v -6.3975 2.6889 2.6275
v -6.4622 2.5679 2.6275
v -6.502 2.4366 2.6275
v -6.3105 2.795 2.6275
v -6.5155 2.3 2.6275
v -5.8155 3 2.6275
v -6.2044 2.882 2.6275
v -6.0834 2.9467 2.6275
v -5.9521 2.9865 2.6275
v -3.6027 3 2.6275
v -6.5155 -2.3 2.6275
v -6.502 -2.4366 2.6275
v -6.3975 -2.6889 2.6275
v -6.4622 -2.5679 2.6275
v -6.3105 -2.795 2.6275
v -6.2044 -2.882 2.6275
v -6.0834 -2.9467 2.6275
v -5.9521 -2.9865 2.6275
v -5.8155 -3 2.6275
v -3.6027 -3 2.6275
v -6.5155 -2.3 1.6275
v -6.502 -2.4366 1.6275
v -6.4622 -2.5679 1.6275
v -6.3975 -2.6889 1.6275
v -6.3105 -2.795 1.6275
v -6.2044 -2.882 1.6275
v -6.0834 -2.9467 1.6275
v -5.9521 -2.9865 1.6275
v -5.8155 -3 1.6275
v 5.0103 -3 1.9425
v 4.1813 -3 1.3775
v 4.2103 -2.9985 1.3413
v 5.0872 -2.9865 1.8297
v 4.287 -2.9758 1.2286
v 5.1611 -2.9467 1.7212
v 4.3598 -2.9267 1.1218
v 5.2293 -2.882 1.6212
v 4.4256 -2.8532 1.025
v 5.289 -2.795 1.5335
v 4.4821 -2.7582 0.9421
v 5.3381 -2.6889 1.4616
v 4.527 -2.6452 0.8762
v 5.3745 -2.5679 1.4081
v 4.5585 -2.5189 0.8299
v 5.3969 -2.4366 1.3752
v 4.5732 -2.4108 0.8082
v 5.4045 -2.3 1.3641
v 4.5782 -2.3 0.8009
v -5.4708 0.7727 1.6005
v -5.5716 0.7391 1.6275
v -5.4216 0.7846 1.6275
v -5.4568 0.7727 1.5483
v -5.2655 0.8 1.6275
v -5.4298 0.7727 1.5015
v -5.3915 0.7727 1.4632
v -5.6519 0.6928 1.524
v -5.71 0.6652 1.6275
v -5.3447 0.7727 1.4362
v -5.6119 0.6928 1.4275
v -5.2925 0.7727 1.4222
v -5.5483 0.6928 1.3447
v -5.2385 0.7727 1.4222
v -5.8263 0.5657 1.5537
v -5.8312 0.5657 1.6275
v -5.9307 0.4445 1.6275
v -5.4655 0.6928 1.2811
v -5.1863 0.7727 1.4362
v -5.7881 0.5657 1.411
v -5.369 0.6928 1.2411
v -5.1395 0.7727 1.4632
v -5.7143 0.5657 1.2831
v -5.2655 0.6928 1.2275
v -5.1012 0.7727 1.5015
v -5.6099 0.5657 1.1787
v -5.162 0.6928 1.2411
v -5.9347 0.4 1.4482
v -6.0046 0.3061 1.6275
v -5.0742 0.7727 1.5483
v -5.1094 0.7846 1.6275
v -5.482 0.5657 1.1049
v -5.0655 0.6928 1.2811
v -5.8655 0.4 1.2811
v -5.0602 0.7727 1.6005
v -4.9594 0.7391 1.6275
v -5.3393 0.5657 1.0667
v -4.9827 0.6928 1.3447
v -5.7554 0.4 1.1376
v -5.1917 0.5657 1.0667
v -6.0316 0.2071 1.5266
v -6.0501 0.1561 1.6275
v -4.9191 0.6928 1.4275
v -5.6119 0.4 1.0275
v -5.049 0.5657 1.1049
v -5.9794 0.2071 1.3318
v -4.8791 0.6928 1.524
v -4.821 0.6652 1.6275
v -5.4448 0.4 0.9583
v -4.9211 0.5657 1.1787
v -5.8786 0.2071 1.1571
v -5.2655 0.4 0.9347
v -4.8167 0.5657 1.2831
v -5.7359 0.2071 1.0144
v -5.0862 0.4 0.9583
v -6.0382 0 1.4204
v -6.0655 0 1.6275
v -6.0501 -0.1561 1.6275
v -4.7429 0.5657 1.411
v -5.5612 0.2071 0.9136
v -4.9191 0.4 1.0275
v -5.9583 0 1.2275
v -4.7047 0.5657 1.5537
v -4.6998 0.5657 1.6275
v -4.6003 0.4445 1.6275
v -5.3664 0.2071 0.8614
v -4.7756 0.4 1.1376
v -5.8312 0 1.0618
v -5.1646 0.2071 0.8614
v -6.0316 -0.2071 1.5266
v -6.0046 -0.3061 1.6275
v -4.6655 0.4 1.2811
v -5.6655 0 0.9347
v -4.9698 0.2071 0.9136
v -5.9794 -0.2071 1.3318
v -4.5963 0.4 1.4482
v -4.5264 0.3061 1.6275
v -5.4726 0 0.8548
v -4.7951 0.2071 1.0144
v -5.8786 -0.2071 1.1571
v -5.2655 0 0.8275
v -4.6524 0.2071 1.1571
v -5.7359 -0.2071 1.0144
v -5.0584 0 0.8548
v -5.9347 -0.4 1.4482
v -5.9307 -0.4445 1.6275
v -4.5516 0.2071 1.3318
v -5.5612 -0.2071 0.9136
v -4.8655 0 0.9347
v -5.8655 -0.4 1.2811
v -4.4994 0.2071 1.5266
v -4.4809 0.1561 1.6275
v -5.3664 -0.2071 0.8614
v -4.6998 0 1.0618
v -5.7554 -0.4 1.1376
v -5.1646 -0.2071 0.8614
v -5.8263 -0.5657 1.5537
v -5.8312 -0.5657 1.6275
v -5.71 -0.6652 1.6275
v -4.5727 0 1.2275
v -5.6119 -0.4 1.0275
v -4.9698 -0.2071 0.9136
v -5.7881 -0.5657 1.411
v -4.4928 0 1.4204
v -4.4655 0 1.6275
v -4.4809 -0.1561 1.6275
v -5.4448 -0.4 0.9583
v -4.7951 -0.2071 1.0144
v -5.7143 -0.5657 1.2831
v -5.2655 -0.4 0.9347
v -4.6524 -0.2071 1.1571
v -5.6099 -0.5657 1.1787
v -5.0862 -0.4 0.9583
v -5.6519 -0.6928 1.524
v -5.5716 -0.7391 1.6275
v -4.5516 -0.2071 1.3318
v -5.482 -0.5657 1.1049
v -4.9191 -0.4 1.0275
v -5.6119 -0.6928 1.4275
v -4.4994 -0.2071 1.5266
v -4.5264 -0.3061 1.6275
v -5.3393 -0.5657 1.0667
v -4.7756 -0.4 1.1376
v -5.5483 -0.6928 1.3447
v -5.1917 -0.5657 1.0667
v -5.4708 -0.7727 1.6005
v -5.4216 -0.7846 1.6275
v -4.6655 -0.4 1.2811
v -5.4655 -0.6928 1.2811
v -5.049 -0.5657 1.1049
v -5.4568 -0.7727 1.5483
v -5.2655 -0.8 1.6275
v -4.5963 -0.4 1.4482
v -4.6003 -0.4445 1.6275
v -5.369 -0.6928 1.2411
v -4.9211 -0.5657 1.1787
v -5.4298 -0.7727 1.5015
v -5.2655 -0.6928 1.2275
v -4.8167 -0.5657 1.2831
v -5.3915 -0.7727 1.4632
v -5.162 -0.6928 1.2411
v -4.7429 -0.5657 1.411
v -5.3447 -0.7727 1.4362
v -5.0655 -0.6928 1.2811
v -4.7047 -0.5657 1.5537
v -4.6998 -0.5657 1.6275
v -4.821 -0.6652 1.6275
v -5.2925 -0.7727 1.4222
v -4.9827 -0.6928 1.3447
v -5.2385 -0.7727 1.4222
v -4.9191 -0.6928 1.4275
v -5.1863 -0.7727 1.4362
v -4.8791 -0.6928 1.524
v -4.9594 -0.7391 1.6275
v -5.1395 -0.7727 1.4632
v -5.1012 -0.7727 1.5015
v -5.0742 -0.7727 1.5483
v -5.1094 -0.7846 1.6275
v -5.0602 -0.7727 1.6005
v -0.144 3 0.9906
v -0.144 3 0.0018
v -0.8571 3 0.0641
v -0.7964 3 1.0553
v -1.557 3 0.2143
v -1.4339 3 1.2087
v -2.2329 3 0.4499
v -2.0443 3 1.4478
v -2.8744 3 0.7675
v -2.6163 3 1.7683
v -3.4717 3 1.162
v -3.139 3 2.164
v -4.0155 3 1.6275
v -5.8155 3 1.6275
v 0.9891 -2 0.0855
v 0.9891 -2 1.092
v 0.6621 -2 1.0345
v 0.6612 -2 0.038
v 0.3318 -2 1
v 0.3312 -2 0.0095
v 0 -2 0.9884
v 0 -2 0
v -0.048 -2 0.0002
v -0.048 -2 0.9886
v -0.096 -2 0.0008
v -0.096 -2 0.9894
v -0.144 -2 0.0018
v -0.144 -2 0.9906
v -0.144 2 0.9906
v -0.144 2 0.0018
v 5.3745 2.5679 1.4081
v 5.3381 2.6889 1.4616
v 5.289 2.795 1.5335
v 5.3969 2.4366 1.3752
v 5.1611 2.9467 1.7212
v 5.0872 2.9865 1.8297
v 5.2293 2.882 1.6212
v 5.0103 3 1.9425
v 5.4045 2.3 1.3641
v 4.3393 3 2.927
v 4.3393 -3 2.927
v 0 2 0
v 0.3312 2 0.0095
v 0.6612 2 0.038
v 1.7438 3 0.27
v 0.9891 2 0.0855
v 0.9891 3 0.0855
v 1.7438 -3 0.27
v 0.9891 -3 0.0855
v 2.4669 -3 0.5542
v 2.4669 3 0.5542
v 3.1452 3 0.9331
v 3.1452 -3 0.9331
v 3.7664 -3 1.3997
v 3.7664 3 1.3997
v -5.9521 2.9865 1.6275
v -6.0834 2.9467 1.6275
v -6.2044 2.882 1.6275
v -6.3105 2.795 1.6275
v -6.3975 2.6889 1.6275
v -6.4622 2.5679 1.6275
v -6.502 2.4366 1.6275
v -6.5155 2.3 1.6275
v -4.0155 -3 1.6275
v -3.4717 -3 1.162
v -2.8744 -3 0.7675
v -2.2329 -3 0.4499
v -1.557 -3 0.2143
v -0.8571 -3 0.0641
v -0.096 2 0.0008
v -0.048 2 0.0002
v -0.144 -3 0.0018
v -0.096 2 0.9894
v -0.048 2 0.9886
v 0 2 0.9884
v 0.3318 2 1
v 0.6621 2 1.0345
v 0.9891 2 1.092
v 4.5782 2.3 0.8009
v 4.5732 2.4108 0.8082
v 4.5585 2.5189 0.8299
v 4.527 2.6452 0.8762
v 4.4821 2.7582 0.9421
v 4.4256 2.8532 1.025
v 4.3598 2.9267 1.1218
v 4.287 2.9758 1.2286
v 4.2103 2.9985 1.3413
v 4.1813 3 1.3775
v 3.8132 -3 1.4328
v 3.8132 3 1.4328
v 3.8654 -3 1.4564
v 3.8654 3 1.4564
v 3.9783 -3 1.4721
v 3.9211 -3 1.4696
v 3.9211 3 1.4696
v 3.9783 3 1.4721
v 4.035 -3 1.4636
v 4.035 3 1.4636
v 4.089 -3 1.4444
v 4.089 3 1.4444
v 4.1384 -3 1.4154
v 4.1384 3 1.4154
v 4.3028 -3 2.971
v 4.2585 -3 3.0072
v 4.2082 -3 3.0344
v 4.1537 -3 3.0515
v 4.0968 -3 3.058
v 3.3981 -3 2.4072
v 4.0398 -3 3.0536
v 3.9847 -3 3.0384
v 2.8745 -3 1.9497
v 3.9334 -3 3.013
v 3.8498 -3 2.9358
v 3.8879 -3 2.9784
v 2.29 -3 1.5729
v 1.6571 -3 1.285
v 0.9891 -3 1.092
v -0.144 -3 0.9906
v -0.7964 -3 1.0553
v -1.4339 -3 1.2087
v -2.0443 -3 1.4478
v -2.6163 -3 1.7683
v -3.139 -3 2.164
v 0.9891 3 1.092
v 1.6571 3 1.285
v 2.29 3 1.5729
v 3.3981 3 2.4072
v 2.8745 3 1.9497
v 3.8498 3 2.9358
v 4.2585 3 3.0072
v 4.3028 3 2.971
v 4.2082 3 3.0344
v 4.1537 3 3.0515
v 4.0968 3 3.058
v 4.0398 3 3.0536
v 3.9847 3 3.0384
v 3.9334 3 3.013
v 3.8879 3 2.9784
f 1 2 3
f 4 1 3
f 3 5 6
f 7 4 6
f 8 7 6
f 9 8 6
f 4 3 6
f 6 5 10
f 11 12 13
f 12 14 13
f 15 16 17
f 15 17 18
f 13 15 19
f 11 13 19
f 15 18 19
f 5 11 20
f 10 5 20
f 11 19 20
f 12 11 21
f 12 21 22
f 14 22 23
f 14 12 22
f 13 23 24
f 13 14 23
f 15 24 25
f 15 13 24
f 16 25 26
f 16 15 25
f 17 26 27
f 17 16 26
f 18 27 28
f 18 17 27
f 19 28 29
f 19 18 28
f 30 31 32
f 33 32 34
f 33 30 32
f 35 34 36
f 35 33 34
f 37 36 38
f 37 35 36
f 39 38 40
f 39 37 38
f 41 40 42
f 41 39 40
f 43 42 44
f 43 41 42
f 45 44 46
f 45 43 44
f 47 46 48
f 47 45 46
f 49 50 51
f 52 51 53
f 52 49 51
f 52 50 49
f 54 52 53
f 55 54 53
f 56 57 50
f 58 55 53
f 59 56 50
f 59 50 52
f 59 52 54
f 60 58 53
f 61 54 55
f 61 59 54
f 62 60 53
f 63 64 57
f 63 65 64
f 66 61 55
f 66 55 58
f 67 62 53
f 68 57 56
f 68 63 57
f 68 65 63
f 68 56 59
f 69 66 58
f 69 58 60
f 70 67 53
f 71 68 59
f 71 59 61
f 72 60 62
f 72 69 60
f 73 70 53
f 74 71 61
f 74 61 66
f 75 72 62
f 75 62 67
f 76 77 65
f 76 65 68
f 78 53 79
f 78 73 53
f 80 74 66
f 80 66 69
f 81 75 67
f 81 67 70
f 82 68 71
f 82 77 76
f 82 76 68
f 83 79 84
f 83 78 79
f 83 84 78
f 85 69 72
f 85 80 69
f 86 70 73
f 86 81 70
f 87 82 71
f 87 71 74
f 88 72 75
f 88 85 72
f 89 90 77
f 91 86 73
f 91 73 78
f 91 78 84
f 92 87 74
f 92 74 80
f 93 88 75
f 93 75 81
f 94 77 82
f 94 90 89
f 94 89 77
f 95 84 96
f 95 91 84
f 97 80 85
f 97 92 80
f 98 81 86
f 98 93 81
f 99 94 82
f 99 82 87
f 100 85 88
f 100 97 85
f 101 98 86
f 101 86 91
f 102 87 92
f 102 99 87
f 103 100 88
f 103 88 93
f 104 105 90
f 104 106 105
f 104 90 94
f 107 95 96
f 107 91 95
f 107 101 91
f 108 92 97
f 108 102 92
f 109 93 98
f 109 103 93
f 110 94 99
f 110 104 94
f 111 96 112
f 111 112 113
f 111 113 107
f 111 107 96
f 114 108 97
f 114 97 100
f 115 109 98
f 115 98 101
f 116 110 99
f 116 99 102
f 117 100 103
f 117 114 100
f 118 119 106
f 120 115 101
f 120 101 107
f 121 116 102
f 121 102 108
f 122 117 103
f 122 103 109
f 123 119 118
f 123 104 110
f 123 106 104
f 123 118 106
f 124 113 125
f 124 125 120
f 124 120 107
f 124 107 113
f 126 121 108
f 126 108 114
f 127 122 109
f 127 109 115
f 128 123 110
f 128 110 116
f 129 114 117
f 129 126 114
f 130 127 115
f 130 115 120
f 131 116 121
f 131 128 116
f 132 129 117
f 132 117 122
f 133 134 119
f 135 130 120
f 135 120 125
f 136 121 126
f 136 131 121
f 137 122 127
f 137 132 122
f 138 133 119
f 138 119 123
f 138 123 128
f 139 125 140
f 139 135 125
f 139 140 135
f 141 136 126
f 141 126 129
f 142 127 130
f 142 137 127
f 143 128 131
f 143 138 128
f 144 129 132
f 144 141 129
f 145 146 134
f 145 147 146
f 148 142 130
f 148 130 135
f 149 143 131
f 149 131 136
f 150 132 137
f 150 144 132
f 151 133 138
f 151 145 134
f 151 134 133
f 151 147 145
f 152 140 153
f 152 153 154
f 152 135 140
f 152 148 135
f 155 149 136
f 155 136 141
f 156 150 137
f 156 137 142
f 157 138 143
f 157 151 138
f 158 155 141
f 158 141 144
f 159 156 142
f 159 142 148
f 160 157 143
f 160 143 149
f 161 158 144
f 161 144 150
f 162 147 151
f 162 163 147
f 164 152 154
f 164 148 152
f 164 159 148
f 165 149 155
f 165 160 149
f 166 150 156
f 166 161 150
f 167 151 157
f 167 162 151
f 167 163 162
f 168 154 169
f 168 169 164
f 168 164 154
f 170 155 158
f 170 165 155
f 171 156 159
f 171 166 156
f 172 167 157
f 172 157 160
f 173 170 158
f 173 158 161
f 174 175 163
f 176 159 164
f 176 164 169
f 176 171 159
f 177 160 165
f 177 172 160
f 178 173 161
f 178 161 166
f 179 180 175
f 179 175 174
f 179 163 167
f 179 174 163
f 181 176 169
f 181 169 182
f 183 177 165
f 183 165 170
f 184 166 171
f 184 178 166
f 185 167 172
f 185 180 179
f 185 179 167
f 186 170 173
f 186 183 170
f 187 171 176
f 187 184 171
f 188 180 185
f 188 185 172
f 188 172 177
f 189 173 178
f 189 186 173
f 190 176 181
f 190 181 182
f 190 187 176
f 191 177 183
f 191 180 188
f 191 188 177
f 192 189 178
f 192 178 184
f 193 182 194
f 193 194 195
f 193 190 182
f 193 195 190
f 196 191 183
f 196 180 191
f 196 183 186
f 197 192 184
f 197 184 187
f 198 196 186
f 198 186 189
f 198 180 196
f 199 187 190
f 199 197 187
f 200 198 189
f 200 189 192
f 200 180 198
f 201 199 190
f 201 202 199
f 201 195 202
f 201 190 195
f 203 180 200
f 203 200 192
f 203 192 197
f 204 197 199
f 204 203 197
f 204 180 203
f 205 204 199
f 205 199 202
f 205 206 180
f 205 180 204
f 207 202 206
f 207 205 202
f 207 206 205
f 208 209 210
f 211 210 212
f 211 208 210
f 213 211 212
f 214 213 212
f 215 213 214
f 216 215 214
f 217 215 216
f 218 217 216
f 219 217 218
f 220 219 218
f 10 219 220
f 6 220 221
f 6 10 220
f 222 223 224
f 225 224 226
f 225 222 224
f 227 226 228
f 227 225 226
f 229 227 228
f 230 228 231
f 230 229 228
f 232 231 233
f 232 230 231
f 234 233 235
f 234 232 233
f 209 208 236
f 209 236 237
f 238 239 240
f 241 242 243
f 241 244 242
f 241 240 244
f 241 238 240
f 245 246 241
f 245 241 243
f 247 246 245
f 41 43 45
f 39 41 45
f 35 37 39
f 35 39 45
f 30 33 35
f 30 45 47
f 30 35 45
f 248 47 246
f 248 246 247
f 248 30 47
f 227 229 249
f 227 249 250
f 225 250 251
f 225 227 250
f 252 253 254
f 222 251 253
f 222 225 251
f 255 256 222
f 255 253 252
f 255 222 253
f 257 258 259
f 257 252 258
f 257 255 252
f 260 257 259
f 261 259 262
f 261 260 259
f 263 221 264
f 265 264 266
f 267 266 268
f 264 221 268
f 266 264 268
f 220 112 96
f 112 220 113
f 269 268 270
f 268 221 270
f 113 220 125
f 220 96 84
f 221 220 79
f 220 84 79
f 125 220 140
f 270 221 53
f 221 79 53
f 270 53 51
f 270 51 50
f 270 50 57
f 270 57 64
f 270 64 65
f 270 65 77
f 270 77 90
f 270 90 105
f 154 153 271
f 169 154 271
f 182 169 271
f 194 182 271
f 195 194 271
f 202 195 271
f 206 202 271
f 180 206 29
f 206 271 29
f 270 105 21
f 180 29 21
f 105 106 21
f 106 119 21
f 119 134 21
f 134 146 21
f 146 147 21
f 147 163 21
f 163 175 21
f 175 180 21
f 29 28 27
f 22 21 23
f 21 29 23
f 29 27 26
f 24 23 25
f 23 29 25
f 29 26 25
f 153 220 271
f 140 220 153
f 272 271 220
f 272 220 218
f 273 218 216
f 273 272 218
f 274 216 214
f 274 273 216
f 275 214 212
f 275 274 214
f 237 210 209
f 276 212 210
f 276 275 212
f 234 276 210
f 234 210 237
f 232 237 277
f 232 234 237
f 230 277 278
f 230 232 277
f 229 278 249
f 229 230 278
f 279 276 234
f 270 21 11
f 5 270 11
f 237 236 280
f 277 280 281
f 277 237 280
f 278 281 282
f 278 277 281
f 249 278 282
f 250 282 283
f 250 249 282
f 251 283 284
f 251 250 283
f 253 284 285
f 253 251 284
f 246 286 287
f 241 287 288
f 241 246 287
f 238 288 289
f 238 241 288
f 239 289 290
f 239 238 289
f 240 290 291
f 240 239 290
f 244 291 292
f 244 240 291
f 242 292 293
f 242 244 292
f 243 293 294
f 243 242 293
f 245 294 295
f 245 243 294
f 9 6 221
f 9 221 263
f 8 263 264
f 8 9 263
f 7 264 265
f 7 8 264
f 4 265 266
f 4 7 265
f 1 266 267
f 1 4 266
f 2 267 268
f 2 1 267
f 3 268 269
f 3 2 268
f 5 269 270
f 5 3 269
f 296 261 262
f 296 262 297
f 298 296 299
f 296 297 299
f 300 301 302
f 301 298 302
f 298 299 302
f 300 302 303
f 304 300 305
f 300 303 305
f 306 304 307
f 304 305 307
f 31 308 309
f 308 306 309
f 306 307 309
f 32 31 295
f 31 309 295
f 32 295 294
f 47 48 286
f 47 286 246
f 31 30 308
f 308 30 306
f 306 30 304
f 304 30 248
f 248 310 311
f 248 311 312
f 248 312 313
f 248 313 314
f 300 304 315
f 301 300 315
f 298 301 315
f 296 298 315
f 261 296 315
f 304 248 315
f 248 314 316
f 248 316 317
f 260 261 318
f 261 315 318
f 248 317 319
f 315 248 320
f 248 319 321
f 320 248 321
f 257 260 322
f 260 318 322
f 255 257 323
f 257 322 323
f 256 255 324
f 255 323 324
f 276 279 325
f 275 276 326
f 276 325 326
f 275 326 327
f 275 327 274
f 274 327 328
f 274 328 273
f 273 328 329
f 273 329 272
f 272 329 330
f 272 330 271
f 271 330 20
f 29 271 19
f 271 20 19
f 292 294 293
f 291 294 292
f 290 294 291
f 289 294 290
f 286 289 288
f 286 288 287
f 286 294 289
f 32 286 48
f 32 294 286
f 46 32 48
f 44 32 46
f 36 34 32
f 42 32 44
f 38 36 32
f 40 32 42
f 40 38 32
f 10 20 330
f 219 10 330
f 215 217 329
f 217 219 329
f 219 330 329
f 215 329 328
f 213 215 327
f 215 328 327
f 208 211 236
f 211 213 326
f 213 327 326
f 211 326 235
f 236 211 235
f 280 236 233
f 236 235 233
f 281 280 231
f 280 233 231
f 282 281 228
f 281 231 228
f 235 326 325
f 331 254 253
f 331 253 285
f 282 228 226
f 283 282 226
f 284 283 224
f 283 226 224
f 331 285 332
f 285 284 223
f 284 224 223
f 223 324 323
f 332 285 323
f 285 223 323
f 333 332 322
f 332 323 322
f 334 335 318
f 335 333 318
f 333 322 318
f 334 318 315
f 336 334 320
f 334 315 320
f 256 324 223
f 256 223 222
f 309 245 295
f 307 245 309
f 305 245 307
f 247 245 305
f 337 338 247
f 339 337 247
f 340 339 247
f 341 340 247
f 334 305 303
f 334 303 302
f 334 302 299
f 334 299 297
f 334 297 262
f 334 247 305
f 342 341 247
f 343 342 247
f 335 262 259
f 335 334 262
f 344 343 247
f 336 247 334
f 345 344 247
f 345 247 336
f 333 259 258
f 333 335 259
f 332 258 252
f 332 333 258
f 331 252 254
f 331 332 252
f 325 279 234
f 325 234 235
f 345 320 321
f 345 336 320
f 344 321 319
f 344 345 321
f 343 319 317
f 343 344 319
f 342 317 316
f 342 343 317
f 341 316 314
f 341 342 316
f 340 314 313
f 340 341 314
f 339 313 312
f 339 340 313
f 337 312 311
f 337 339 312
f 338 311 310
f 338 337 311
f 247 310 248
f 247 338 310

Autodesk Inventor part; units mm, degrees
ref_plane "YZ Plane" through (0, 0, 0) normal (1, 0, 0) x (0, 1, 0)
ref_plane "XZ Plane" through (0, 0, 0) normal (0, 1, 0) x (-1, 0, 0)
ref_plane "XY Plane" through (0, 0, 0) normal (0, 0, 1) x (1, 0, 0)
sketch "Boceto1" plane through (0, 0, 0) normal (0, 1, 0) x (-1, 0, 0)
  arc A0 (0, 0) -> (4.0155, 1.6275) centre (-0.0005, 5.7684) ccw
  arc A1 (0, 0.9884) -> (3.6027, 2.6275) centre (-0.0005, 5.7684) ccw
  line L0 (4.0155, 1.6275) -> (5.0155, 1.6275)
  line L1 (6.0155, 1.6275) -> (6.5155, 1.6275)
  line L2 (6.5155, 1.6275) -> (6.5155, 2.6275)
  line L3 (6.5155, 2.6275) -> (3.6027, 2.6275)
  line L4 (0, 0.9884) -> (0, 0)
  arc A2 (-4.0155, 1.6275) -> (0, 0) centre (0.0005, 5.7684) ccw
  arc A3 (-4.0892, 3.294) -> (0, 0.9884) centre (0.0005, 5.7684) ccw
  line L5 (-4.0155, 1.6275) -> (-4.5782, 0.8009)
  line L6 (-4.5782, 0.8009) -> (-5.4045, 1.3641)
  line L7 (-5.4045, 1.3641) -> (-4.0892, 3.294)
  line L8 (5.0155, 1.6275) -> (6.0155, 1.6275)
  dimension "d1" = 4.78
  dimension "d2" = 1
  dimension "d3" = 1
  dimension "d4" = 0.5
  dimension "d5" = 1
  dimension "d6" = 1
  dimension "d7" = 1
extrude "Extrusión1" add sketch "Boceto1" along normal mid plane 6
sketch "Boceto2" plane through (-4.0155, 3, 1.6275) normal (0, 0, -1) x (-1, 0, 0)
  line L0 (2.5, -6) -> (2.5, 0) projected
  line L1 (0, 0) -> (2.5, 0) projected
  line L2 (0, -6) -> (0, 0) projected
  line L3 (2.5, -6) -> (0, -6) projected
  circle A0 centre (1.25, -3) radius 0.8
  line L4 (1.25, -2.2) -> (1.25, -3.8)
  point P0 (-4.0155, -3)
  dimension "d10" = 1.6
revolve "Revolución1" add sketch "Boceto2" angle 360 about axis through (-5.2655, 0.8, 1.6275) along (0, -1, 0) picked at (1.0732, -3.1996) contours L4 A0
ref_plane "Plano de trabajo1" through (0.9621, 4, -0.4105) normal (0, 1, 0) x (1, 0, 0)
sketch "Boceto3" plane through (0.9621, 4, -0.4105) normal (0, 1, 0) x (1, 0, 0)
  line L0 (0.027, -3.311) -> (-1.1061, -3.311)
  line L1 (-1.1061, -3.311) -> (-1.1061, 0.0355)
  line L2 (-1.1061, 0.0355) -> (0.027, 0.0355)
  line L3 (0.027, 0.0355) -> (0.027, -3.311)
  point P0 (-0.9621, -0.4105)
  dimension "d14" = 3.3465
extrude "Extrusión2" cut sketch "Boceto3" against normal blind 2
ref_plane "Plano de trabajo2" through (0, 0, 0) normal (0, 1, 0) x (1, 0, 0)
mirror "Simetría1" about plane through (0, 0, 0) normal (0, 1, 0) of "Extrusión2"
fillet "Empalme1" radius 0.7 4 edges at (-6.5155, 3, 2.1275) (-6.5155, -3, 2.1275) (4.9914, -3, 1.0825) (4.9914, 3, 1.0825)
fillet "Empalme2" radius 0.3 1 edges at (4.0892, 0, 3.294)
fillet "Empalme3" radius 0.3 1 edges at (4.0155, 0, 1.6275)
properties part number "InteriorSw" material "----------"
